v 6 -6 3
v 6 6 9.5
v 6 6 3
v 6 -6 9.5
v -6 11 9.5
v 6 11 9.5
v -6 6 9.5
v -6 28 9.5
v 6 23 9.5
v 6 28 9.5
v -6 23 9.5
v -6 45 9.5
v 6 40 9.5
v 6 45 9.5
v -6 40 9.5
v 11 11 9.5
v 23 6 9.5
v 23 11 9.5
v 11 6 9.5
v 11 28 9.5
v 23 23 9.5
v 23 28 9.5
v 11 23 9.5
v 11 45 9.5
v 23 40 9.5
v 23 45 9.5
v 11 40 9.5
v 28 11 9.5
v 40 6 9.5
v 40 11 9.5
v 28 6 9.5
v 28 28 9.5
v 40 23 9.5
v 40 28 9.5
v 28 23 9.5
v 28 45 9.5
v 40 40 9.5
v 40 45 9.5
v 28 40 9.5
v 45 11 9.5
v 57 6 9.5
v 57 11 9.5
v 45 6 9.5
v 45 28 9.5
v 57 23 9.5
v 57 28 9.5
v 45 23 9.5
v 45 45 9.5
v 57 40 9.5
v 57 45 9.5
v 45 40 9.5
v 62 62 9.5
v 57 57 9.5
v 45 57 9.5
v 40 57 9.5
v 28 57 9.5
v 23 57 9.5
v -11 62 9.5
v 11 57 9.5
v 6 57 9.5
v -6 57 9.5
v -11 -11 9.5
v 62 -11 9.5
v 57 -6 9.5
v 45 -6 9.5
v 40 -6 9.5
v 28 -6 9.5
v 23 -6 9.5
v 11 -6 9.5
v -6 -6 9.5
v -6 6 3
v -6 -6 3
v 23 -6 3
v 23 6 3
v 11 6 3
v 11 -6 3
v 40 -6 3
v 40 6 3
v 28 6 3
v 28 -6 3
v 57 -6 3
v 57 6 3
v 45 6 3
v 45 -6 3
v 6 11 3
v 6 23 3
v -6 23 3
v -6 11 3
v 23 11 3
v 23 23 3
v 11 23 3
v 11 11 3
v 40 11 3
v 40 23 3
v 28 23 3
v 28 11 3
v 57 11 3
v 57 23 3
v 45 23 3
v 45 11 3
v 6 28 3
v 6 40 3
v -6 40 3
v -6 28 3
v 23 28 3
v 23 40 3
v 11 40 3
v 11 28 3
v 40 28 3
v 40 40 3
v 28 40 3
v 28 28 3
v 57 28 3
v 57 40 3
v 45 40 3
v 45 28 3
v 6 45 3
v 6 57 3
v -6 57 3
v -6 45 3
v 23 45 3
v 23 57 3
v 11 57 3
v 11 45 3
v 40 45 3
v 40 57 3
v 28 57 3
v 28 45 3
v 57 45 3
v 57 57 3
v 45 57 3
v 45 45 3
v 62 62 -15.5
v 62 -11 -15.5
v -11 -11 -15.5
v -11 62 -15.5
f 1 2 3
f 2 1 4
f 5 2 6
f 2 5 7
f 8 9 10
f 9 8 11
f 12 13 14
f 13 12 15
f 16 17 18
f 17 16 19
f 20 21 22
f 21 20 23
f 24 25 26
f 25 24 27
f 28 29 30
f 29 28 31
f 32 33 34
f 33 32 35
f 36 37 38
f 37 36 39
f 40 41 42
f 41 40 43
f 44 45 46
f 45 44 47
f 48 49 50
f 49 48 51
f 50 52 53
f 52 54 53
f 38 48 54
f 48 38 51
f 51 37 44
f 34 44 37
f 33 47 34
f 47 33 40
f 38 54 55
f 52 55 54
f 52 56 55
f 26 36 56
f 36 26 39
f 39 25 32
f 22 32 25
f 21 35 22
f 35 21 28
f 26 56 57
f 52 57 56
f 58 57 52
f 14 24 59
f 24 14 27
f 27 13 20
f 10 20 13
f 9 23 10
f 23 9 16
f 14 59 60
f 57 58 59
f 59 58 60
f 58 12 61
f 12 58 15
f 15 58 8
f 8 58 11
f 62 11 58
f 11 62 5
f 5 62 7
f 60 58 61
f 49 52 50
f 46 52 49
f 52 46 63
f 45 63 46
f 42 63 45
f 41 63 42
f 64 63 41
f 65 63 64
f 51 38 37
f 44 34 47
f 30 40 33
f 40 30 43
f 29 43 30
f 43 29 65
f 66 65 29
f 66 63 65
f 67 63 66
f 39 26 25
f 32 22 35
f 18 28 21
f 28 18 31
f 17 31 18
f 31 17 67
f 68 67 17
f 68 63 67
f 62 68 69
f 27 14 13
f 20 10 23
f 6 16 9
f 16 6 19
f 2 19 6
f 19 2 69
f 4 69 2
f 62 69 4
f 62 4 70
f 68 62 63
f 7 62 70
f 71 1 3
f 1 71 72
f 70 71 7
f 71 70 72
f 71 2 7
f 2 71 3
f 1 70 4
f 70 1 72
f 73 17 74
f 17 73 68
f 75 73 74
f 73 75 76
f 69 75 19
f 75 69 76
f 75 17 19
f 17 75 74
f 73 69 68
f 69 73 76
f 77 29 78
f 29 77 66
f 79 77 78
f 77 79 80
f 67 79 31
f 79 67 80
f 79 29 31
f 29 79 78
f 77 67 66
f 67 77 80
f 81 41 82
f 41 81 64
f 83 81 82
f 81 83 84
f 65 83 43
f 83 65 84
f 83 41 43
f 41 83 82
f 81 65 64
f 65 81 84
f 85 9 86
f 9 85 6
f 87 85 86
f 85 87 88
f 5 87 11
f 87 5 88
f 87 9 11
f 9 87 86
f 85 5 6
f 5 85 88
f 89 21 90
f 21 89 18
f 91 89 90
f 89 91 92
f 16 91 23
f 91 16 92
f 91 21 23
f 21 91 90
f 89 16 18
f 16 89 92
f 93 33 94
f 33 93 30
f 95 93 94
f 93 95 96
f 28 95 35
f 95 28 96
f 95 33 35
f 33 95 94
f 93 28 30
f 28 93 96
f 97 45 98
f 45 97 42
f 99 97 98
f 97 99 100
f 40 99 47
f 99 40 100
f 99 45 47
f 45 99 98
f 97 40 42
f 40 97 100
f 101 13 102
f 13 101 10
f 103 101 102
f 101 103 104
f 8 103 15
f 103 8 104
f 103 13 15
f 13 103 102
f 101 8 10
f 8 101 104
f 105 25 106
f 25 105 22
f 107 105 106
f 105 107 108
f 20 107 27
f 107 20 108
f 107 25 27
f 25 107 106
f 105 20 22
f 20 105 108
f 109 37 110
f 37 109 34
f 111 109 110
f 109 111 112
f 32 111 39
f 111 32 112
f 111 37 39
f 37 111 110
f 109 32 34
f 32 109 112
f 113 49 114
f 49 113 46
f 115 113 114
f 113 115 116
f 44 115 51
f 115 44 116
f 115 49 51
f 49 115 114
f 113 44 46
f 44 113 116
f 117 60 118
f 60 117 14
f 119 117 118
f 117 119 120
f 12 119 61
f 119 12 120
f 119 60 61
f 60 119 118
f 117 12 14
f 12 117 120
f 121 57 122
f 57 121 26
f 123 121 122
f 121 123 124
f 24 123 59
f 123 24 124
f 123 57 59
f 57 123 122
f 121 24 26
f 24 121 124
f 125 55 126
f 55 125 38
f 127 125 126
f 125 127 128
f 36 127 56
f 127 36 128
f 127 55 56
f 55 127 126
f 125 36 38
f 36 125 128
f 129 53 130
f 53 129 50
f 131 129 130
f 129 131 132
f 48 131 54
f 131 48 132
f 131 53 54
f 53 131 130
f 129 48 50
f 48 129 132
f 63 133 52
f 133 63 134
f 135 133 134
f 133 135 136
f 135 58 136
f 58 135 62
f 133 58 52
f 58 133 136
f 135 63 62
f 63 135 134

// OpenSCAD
difference() {
  translate([25.4999950000, 25.4999950000, -3.0000000000]) {
    scale([73.0000000000, 73.0000000000, 25.0000000000]) {
      translate([-0.5000000000, -0.5000000000, -0.5000000000]) {
        cube([1, 1, 1]);
      }
    }
  }
  union() {
    union() {
      union() {
        union() {
          union() {
            union() {
              union() {
                union() {
                  union() {
                    union() {
                      union() {
                        union() {
                          union() {
                            union() {
                              union() {
                                translate([0.0000000000, 0.0000000000, 6.2500000000]) {
                                  scale([12.0000000000, 12.0000000000, 6.5000000000]) {
                                    translate([-0.5000000000, -0.5000000000, -0.5000000000]) {
                                      cube([1, 1, 1]);
                                    }
                                  }
                                }
                                translate([17.0000000000, 0.0000000000, 6.2500000000]) {
                                  scale([12.0000000000, 12.0000000000, 6.5000000000]) {
                                    translate([-0.5000000000, -0.5000000000, -0.5000000000]) {
                                      cube([1, 1, 1]);
                                    }
                                  }
                                }
                              }
                              translate([34.0000000000, 0.0000000000, 6.2500000000]) {
                                scale([12.0000000000, 12.0000000000, 6.5000000000]) {
                                  translate([-0.5000000000, -0.5000000000, -0.5000000000]) {
                                    cube([1, 1, 1]);
                                  }
                                }
                              }
                            }
                            translate([51.0000000000, 0.0000000000, 6.2500000000]) {
                              scale([12.0000000000, 12.0000000000, 6.5000000000]) {
                                translate([-0.5000000000, -0.5000000000, -0.5000000000]) {
                                  cube([1, 1, 1]);
                                }
                              }
                            }
                          }
                          translate([0.0000000000, 17.0000000000, 6.2500000000]) {
                            scale([12.0000000000, 12.0000000000, 6.5000000000]) {
                              translate([-0.5000000000, -0.5000000000, -0.5000000000]) {
                                cube([1, 1, 1]);
                              }
                            }
                          }
                        }
                        translate([17.0000000000, 17.0000000000, 6.2500000000]) {
                          scale([12.0000000000, 12.0000000000, 6.5000000000]) {
                            translate([-0.5000000000, -0.5000000000, -0.5000000000]) {
                              cube([1, 1, 1]);
                            }
                          }
                        }
                      }
                      translate([34.0000000000, 17.0000000000, 6.2500000000]) {
                        scale([12.0000000000, 12.0000000000, 6.5000000000]) {
                          translate([-0.5000000000, -0.5000000000, -0.5000000000]) {
                            cube([1, 1, 1]);
                          }
                        }
                      }
                    }
                    translate([51.0000000000, 17.0000000000, 6.2500000000]) {
                      scale([12.0000000000, 12.0000000000, 6.5000000000]) {
                        translate([-0.5000000000, -0.5000000000, -0.5000000000]) {
                          cube([1, 1, 1]);
                        }
                      }
                    }
                  }
                  translate([0.0000000000, 34.0000000000, 6.2500000000]) {
                    scale([12.0000000000, 12.0000000000, 6.5000000000]) {
                      translate([-0.5000000000, -0.5000000000, -0.5000000000]) {
                        cube([1, 1, 1]);
                      }
                    }
                  }
                }
                translate([17.0000000000, 34.0000000000, 6.2500000000]) {
                  scale([12.0000000000, 12.0000000000, 6.5000000000]) {
                    translate([-0.5000000000, -0.5000000000, -0.5000000000]) {
                      cube([1, 1, 1]);
                    }
                  }
                }
              }
              translate([34.0000000000, 34.0000000000, 6.2500000000]) {
                scale([12.0000000000, 12.0000000000, 6.5000000000]) {
                  translate([-0.5000000000, -0.5000000000, -0.5000000000]) {
                    cube([1, 1, 1]);
                  }
                }
              }
            }
            translate([51.0000000000, 34.0000000000, 6.2500000000]) {
              scale([12.0000000000, 12.0000000000, 6.5000000000]) {
                translate([-0.5000000000, -0.5000000000, -0.5000000000]) {
                  cube([1, 1, 1]);
                }
              }
            }
          }
          translate([0.0000000000, 51.0000000000, 6.2500000000]) {
            scale([12.0000000000, 12.0000000000, 6.5000000000]) {
              translate([-0.5000000000, -0.5000000000, -0.5000000000]) {
                cube([1, 1, 1]);
              }
            }
          }
        }
        translate([17.0000000000, 51.0000000000, 6.2500000000]) {
          scale([12.0000000000, 12.0000000000, 6.5000000000]) {
            translate([-0.5000000000, -0.5000000000, -0.5000000000]) {
              cube([1, 1, 1]);
            }
          }
        }
      }
      translate([34.0000000000, 51.0000000000, 6.2500000000]) {
        scale([12.0000000000, 12.0000000000, 6.5000000000]) {
          translate([-0.5000000000, -0.5000000000, -0.5000000000]) {
            cube([1, 1, 1]);
          }
        }
      }
    }
    translate([51.0000000000, 51.0000000000, 6.2500000000]) {
      scale([12.0000000000, 12.0000000000, 6.5000000000]) {
        translate([-0.5000000000, -0.5000000000, -0.5000000000]) {
          cube([1, 1, 1]);
        }
      }
    }
  }
}
